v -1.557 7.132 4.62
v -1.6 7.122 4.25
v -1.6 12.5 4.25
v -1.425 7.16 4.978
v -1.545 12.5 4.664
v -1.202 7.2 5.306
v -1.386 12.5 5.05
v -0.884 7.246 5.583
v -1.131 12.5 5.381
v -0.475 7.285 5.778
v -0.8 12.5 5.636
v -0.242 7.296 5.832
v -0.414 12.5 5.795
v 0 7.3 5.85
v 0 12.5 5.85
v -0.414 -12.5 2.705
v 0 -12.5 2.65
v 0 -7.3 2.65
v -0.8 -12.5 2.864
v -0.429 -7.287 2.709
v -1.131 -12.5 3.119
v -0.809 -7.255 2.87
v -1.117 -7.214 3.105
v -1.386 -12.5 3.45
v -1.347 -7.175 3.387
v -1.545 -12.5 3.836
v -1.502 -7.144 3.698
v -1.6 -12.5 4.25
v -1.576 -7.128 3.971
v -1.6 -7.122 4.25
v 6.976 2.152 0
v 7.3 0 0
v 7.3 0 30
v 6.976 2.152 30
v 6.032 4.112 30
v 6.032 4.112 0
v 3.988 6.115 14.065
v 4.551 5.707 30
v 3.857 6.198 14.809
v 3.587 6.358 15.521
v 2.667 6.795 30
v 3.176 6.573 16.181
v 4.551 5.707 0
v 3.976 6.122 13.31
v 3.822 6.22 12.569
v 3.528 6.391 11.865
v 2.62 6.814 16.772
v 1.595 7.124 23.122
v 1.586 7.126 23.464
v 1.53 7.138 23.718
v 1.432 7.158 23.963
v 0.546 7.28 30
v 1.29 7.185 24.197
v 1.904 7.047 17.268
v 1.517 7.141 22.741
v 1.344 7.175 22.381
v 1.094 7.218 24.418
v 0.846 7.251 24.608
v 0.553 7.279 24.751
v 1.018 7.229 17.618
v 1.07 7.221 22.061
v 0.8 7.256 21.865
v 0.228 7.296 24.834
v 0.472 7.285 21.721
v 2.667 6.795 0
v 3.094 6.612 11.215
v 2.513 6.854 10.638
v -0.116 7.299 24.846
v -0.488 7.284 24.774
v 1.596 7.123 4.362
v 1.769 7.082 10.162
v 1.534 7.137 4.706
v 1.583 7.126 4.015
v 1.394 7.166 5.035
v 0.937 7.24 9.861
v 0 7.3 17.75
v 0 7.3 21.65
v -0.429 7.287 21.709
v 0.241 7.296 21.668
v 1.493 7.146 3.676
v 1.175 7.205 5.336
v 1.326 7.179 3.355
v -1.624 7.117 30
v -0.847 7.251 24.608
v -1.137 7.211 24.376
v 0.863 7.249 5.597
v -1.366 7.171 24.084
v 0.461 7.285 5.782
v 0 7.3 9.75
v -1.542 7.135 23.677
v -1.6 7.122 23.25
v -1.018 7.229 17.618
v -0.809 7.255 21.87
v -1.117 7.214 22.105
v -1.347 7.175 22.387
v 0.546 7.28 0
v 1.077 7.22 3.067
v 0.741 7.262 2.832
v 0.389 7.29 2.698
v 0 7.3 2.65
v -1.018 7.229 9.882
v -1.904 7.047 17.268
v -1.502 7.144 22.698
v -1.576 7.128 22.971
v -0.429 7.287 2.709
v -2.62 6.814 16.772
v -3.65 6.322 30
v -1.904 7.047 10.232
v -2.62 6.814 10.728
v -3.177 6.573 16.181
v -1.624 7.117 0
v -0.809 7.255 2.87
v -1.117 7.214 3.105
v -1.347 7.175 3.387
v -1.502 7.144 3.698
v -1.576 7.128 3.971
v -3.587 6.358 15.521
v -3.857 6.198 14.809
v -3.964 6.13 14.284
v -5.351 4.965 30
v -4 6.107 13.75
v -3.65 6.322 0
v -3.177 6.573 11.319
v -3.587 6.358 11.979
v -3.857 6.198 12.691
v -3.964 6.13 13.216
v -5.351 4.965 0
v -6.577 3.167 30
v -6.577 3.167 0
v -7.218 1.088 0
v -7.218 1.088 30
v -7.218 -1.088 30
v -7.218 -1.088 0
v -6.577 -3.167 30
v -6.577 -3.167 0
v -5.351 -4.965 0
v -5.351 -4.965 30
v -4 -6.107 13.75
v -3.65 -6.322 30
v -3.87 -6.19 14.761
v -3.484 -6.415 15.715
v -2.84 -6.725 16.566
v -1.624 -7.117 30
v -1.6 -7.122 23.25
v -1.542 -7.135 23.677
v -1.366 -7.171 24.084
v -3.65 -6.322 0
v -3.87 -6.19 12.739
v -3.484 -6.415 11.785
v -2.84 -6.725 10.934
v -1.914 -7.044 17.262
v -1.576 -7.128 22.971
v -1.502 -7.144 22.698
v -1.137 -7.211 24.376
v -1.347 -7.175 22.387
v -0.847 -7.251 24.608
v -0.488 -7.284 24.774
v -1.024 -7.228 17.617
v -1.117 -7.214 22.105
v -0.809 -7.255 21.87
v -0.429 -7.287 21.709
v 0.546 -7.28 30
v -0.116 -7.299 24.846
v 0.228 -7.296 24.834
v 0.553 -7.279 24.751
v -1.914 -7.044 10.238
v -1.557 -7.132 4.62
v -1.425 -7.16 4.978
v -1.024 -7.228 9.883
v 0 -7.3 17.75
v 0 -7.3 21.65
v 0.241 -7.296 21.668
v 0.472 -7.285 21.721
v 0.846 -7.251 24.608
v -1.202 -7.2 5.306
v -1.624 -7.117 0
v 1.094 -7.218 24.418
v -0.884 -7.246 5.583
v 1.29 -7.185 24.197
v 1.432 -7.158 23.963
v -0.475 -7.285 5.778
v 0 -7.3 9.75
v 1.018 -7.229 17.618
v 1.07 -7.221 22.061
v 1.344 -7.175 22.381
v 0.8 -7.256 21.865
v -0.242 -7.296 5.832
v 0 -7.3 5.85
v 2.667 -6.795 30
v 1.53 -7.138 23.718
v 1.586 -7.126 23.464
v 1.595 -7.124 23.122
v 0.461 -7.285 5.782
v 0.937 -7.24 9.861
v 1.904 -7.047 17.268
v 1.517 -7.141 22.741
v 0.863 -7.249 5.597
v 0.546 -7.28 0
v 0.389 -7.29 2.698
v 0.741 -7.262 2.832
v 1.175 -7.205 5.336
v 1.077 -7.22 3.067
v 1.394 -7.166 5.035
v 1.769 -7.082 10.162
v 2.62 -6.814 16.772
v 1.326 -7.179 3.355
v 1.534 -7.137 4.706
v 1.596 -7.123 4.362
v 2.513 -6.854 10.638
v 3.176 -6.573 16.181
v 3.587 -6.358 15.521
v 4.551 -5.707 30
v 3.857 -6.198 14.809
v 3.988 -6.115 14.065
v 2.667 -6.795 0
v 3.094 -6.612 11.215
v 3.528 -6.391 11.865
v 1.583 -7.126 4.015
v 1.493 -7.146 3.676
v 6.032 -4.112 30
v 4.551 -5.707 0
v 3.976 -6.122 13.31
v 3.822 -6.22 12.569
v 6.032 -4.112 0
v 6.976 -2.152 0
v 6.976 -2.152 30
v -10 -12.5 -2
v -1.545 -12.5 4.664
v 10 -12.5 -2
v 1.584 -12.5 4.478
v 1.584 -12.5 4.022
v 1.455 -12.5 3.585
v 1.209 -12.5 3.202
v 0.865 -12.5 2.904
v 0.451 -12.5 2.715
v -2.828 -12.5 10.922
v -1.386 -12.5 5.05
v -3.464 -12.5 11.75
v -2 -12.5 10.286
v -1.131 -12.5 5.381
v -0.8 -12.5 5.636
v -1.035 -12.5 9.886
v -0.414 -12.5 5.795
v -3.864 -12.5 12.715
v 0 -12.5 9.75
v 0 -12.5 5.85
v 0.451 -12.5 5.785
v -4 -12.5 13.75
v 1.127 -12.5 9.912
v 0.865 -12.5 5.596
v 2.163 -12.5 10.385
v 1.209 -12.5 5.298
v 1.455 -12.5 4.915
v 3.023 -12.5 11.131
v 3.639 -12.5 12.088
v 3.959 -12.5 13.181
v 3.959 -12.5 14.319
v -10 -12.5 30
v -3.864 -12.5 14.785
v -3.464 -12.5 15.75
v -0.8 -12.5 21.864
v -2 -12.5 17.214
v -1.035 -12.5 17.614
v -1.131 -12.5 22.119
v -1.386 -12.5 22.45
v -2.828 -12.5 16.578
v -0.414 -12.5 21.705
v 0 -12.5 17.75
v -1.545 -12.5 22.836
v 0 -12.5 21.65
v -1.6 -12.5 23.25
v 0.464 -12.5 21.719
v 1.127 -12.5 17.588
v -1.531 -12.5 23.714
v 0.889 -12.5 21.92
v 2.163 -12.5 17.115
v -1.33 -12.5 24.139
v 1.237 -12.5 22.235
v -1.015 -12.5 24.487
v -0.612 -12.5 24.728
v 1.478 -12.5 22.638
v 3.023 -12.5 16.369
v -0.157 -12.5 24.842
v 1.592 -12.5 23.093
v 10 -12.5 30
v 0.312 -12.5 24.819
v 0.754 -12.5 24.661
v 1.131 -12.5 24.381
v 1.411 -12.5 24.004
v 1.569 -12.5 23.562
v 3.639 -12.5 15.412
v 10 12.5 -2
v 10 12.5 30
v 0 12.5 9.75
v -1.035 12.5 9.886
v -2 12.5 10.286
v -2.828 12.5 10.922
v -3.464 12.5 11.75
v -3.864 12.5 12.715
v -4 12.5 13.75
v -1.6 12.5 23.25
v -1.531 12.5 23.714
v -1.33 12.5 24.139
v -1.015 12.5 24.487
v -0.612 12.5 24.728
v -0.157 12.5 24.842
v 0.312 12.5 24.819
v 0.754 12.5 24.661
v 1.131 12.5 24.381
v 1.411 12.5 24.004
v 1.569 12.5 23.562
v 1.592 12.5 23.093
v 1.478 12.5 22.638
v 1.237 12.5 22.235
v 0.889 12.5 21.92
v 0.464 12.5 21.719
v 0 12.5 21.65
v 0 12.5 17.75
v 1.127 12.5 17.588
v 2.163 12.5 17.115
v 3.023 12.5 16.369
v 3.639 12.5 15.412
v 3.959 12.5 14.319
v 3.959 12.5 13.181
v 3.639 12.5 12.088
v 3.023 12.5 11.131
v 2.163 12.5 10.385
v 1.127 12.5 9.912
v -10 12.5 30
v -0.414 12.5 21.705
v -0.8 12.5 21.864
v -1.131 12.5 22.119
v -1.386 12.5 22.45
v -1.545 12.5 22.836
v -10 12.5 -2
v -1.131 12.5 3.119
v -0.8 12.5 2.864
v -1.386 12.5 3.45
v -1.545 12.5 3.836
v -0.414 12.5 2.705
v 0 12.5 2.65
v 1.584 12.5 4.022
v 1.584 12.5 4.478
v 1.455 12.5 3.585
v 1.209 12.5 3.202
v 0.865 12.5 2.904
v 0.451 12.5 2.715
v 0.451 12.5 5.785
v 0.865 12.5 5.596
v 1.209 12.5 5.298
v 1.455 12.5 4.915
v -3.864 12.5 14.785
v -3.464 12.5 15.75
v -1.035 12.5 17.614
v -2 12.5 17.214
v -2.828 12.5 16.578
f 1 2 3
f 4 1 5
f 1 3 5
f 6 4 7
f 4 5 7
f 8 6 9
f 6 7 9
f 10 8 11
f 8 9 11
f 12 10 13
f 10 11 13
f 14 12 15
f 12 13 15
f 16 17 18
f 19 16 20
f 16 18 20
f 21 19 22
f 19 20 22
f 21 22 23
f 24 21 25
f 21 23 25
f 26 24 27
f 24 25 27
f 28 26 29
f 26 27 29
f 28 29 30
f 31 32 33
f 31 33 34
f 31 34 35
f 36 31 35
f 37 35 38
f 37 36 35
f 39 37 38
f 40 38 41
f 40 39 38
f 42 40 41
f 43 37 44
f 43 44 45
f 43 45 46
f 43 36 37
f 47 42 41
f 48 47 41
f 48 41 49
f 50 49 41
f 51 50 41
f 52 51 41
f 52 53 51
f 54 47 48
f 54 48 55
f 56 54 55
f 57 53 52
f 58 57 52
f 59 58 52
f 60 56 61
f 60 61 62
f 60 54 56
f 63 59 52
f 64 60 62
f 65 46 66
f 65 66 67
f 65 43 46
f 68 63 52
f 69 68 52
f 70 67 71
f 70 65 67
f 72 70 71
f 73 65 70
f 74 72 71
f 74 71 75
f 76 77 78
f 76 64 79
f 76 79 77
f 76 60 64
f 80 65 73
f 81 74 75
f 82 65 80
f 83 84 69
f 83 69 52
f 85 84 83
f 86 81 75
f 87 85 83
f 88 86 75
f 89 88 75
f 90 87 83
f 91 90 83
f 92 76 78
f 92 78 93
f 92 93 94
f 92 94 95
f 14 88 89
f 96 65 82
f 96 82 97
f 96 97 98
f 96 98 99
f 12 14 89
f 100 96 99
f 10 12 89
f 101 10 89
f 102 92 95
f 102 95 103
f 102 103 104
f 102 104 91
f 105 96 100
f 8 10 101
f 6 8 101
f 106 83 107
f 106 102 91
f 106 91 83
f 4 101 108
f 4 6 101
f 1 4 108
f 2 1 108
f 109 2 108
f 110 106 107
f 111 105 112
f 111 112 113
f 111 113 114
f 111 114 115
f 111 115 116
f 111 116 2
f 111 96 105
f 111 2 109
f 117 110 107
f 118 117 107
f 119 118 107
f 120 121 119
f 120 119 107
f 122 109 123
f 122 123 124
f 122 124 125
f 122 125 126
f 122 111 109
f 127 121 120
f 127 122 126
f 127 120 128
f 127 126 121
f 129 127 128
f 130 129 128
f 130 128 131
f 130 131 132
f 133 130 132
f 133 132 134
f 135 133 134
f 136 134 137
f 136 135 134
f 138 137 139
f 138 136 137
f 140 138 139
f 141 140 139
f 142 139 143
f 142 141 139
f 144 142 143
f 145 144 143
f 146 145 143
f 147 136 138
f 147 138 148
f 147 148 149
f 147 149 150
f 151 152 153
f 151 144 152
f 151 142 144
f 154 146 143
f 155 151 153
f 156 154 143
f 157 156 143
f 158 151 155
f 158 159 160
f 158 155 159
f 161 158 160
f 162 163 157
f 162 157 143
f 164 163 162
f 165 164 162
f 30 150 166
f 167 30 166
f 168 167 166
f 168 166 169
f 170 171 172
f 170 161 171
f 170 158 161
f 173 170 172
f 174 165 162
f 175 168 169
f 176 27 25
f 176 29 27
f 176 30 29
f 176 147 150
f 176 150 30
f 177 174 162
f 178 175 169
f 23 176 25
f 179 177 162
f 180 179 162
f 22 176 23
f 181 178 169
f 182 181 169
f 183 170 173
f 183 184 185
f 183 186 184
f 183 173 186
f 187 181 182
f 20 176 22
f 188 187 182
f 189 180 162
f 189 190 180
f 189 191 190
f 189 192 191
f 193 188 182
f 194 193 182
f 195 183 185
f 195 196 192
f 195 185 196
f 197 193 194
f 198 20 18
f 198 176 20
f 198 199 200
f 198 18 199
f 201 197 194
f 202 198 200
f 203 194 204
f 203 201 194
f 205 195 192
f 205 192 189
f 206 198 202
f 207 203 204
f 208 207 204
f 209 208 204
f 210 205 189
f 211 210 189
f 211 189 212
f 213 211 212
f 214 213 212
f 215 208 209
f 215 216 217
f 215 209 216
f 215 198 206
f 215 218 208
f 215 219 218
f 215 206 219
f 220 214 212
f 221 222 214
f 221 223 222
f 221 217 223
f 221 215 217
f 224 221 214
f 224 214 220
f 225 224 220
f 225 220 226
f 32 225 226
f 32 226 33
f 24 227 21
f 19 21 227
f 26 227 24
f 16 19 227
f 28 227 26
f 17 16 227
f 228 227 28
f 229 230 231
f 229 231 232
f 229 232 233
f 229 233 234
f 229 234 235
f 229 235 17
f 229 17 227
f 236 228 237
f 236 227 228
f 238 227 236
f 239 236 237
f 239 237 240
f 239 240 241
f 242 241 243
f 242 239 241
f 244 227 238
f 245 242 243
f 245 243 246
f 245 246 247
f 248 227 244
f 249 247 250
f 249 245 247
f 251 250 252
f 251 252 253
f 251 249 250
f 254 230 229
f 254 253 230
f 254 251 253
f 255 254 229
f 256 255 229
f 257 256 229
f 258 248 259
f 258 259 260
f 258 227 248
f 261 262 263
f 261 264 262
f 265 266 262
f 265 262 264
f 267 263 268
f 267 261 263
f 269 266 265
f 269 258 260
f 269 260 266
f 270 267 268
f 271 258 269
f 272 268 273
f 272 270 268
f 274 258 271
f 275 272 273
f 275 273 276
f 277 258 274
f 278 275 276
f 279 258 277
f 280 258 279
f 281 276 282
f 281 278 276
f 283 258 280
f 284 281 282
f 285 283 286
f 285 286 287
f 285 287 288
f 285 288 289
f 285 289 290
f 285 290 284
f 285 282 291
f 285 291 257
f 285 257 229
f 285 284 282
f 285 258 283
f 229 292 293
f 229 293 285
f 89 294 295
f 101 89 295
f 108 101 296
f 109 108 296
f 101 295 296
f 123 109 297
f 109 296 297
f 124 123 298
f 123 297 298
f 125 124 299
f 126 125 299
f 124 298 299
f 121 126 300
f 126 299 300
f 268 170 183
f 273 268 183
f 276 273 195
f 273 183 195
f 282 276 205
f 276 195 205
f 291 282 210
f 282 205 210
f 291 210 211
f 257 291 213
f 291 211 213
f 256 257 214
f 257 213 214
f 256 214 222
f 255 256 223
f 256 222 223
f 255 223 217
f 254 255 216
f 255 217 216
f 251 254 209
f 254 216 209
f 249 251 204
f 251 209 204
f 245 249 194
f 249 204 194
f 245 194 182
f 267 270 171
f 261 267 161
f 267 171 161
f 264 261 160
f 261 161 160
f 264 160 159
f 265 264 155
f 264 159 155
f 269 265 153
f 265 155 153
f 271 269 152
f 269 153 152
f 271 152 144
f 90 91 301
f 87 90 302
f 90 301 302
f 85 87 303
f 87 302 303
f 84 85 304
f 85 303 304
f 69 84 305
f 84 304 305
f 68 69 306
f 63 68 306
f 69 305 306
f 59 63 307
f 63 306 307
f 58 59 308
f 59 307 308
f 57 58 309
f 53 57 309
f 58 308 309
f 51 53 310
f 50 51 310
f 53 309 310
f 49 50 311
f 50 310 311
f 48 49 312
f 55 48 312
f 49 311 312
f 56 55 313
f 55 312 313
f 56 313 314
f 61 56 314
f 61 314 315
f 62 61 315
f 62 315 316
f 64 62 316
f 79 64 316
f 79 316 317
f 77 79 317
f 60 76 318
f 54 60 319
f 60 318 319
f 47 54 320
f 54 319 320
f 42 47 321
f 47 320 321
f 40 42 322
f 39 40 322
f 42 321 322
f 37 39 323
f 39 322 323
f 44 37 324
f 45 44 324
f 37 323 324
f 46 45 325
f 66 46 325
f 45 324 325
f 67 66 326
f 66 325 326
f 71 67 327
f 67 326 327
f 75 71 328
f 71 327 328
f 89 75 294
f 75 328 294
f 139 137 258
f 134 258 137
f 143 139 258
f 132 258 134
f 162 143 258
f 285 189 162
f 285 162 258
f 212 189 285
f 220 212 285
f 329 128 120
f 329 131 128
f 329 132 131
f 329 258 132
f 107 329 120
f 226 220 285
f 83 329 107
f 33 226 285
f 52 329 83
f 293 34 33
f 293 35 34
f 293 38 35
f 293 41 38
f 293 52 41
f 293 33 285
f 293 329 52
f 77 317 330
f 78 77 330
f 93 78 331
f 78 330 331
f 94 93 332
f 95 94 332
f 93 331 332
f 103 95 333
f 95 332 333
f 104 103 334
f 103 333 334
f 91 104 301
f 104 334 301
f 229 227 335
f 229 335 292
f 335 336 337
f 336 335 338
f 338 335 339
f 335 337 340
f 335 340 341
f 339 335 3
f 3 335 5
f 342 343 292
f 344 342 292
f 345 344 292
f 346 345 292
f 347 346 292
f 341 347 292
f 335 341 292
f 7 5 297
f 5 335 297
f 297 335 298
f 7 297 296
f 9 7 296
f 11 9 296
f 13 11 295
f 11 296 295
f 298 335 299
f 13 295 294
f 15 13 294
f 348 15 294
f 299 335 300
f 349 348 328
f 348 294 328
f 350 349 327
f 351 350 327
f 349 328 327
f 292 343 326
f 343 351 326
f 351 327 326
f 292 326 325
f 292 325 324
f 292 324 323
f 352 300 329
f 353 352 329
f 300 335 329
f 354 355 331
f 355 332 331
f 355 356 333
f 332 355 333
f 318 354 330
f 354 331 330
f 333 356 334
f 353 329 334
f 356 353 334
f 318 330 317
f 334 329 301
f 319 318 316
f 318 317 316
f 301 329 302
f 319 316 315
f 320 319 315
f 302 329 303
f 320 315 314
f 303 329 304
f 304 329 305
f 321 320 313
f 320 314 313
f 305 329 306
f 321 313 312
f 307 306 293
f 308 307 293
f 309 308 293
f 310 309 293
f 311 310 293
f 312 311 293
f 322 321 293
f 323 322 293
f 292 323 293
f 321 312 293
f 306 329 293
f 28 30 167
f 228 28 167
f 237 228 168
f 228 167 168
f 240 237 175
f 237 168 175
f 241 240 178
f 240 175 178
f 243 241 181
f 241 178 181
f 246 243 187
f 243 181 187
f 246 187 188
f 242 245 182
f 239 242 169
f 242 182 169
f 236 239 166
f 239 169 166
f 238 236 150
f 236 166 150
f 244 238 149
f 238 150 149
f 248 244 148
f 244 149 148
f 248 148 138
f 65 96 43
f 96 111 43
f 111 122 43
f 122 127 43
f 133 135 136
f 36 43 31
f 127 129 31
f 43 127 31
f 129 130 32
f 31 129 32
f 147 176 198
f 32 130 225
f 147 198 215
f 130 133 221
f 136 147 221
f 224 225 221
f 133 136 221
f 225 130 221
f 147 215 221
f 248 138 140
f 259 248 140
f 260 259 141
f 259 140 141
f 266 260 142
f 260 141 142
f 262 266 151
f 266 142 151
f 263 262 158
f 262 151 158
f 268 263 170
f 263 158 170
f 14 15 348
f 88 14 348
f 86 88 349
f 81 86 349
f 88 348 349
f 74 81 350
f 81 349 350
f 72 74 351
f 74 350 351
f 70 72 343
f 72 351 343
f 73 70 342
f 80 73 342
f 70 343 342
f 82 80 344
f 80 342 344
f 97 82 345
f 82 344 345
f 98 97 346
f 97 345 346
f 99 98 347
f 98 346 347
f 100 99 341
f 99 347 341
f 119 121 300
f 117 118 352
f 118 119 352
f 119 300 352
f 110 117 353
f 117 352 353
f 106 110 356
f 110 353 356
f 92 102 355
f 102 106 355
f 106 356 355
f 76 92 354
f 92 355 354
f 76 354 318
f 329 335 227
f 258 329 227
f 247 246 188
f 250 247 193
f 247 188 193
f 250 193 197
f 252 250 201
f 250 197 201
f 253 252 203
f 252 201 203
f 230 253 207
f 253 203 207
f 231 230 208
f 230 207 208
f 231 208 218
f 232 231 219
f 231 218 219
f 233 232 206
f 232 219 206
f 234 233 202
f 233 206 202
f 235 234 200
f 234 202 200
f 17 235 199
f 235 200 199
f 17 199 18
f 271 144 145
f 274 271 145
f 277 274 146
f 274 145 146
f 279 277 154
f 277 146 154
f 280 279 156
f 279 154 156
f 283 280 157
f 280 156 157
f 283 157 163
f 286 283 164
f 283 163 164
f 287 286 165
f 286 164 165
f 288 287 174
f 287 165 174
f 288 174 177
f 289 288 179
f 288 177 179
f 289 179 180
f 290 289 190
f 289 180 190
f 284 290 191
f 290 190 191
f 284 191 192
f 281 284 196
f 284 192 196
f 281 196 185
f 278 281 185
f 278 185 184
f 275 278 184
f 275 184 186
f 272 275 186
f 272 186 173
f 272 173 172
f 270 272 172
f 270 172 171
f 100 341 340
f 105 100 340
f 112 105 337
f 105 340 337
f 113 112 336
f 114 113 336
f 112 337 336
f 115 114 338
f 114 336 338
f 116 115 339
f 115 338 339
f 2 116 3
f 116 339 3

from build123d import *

# Parameters (mm, degrees)
F0_W     = 20
F0_H     = 25
F0_R     = 7.3
F1_DEPTH = 30
F4_DEPTH = 25.001
F5_W     = 20
F5_H     = 25
F6_DEPTH = 2


with BuildPart() as f1:
    # F0 (on Top) → F1 (new body)
    with BuildSketch(Plane.XY):
        Rectangle(F0_W, F0_H)
        Circle(F0_R, mode=Mode.SUBTRACT)
    extrude(amount=F1_DEPTH)

    # F3 (on face) → F4 (cut, through all)
    with BuildSketch(Plane(origin=(0, 12.5, 0), x_dir=(-1, 0, 0), z_dir=(0, 1, 0))):
        with BuildLine():
            ThreePointArc((0, 5.85), (-1.6, 4.25), (0, 2.65))
            Line((0, 2.65), (0, 4.25))
            Line((0, 4.25), (0, 5.85))
        make_face()
        with BuildLine():
            ThreePointArc((1.6, 23.25), (-1.1313708499, 24.3813708499), (0, 21.65))
            ThreePointArc((0, 21.65), (1.1313708499, 22.1186291501), (1.6, 23.25))
        make_face()
        with BuildLine():
            ThreePointArc((0, 17.75), (-4, 13.75), (0, 9.75))
            Line((0, 9.75), (0, 17.75))
        make_face()
        with BuildLine():
            Line((0, 17.75), (0, 9.75))
            ThreePointArc((0, 9.75), (2.8284271247, 10.9215728753), (4, 13.75))
            ThreePointArc((4, 13.75), (2.8284271247, 16.5784271247), (0, 17.75))
        make_face()
        with BuildLine():
            Line((0, 4.25), (0, 2.65))
            ThreePointArc((0, 2.65), (1.1313708499, 3.1186291501), (1.6, 4.25))
            ThreePointArc((1.6, 4.25), (1.1313708499, 5.3813708499), (0, 5.85))
            Line((0, 5.85), (0, 4.25))
        make_face()
    extrude(amount=-F4_DEPTH, mode=Mode.SUBTRACT)

    # F5 (on face) → F6 (join)
    with BuildSketch(Plane(origin=(0, 0, 0), x_dir=(1, 0, 0), z_dir=(0, 0, -1))):
        Rectangle(F5_W, F5_H)
    extrude(amount=F6_DEPTH)


solid = f1.part
